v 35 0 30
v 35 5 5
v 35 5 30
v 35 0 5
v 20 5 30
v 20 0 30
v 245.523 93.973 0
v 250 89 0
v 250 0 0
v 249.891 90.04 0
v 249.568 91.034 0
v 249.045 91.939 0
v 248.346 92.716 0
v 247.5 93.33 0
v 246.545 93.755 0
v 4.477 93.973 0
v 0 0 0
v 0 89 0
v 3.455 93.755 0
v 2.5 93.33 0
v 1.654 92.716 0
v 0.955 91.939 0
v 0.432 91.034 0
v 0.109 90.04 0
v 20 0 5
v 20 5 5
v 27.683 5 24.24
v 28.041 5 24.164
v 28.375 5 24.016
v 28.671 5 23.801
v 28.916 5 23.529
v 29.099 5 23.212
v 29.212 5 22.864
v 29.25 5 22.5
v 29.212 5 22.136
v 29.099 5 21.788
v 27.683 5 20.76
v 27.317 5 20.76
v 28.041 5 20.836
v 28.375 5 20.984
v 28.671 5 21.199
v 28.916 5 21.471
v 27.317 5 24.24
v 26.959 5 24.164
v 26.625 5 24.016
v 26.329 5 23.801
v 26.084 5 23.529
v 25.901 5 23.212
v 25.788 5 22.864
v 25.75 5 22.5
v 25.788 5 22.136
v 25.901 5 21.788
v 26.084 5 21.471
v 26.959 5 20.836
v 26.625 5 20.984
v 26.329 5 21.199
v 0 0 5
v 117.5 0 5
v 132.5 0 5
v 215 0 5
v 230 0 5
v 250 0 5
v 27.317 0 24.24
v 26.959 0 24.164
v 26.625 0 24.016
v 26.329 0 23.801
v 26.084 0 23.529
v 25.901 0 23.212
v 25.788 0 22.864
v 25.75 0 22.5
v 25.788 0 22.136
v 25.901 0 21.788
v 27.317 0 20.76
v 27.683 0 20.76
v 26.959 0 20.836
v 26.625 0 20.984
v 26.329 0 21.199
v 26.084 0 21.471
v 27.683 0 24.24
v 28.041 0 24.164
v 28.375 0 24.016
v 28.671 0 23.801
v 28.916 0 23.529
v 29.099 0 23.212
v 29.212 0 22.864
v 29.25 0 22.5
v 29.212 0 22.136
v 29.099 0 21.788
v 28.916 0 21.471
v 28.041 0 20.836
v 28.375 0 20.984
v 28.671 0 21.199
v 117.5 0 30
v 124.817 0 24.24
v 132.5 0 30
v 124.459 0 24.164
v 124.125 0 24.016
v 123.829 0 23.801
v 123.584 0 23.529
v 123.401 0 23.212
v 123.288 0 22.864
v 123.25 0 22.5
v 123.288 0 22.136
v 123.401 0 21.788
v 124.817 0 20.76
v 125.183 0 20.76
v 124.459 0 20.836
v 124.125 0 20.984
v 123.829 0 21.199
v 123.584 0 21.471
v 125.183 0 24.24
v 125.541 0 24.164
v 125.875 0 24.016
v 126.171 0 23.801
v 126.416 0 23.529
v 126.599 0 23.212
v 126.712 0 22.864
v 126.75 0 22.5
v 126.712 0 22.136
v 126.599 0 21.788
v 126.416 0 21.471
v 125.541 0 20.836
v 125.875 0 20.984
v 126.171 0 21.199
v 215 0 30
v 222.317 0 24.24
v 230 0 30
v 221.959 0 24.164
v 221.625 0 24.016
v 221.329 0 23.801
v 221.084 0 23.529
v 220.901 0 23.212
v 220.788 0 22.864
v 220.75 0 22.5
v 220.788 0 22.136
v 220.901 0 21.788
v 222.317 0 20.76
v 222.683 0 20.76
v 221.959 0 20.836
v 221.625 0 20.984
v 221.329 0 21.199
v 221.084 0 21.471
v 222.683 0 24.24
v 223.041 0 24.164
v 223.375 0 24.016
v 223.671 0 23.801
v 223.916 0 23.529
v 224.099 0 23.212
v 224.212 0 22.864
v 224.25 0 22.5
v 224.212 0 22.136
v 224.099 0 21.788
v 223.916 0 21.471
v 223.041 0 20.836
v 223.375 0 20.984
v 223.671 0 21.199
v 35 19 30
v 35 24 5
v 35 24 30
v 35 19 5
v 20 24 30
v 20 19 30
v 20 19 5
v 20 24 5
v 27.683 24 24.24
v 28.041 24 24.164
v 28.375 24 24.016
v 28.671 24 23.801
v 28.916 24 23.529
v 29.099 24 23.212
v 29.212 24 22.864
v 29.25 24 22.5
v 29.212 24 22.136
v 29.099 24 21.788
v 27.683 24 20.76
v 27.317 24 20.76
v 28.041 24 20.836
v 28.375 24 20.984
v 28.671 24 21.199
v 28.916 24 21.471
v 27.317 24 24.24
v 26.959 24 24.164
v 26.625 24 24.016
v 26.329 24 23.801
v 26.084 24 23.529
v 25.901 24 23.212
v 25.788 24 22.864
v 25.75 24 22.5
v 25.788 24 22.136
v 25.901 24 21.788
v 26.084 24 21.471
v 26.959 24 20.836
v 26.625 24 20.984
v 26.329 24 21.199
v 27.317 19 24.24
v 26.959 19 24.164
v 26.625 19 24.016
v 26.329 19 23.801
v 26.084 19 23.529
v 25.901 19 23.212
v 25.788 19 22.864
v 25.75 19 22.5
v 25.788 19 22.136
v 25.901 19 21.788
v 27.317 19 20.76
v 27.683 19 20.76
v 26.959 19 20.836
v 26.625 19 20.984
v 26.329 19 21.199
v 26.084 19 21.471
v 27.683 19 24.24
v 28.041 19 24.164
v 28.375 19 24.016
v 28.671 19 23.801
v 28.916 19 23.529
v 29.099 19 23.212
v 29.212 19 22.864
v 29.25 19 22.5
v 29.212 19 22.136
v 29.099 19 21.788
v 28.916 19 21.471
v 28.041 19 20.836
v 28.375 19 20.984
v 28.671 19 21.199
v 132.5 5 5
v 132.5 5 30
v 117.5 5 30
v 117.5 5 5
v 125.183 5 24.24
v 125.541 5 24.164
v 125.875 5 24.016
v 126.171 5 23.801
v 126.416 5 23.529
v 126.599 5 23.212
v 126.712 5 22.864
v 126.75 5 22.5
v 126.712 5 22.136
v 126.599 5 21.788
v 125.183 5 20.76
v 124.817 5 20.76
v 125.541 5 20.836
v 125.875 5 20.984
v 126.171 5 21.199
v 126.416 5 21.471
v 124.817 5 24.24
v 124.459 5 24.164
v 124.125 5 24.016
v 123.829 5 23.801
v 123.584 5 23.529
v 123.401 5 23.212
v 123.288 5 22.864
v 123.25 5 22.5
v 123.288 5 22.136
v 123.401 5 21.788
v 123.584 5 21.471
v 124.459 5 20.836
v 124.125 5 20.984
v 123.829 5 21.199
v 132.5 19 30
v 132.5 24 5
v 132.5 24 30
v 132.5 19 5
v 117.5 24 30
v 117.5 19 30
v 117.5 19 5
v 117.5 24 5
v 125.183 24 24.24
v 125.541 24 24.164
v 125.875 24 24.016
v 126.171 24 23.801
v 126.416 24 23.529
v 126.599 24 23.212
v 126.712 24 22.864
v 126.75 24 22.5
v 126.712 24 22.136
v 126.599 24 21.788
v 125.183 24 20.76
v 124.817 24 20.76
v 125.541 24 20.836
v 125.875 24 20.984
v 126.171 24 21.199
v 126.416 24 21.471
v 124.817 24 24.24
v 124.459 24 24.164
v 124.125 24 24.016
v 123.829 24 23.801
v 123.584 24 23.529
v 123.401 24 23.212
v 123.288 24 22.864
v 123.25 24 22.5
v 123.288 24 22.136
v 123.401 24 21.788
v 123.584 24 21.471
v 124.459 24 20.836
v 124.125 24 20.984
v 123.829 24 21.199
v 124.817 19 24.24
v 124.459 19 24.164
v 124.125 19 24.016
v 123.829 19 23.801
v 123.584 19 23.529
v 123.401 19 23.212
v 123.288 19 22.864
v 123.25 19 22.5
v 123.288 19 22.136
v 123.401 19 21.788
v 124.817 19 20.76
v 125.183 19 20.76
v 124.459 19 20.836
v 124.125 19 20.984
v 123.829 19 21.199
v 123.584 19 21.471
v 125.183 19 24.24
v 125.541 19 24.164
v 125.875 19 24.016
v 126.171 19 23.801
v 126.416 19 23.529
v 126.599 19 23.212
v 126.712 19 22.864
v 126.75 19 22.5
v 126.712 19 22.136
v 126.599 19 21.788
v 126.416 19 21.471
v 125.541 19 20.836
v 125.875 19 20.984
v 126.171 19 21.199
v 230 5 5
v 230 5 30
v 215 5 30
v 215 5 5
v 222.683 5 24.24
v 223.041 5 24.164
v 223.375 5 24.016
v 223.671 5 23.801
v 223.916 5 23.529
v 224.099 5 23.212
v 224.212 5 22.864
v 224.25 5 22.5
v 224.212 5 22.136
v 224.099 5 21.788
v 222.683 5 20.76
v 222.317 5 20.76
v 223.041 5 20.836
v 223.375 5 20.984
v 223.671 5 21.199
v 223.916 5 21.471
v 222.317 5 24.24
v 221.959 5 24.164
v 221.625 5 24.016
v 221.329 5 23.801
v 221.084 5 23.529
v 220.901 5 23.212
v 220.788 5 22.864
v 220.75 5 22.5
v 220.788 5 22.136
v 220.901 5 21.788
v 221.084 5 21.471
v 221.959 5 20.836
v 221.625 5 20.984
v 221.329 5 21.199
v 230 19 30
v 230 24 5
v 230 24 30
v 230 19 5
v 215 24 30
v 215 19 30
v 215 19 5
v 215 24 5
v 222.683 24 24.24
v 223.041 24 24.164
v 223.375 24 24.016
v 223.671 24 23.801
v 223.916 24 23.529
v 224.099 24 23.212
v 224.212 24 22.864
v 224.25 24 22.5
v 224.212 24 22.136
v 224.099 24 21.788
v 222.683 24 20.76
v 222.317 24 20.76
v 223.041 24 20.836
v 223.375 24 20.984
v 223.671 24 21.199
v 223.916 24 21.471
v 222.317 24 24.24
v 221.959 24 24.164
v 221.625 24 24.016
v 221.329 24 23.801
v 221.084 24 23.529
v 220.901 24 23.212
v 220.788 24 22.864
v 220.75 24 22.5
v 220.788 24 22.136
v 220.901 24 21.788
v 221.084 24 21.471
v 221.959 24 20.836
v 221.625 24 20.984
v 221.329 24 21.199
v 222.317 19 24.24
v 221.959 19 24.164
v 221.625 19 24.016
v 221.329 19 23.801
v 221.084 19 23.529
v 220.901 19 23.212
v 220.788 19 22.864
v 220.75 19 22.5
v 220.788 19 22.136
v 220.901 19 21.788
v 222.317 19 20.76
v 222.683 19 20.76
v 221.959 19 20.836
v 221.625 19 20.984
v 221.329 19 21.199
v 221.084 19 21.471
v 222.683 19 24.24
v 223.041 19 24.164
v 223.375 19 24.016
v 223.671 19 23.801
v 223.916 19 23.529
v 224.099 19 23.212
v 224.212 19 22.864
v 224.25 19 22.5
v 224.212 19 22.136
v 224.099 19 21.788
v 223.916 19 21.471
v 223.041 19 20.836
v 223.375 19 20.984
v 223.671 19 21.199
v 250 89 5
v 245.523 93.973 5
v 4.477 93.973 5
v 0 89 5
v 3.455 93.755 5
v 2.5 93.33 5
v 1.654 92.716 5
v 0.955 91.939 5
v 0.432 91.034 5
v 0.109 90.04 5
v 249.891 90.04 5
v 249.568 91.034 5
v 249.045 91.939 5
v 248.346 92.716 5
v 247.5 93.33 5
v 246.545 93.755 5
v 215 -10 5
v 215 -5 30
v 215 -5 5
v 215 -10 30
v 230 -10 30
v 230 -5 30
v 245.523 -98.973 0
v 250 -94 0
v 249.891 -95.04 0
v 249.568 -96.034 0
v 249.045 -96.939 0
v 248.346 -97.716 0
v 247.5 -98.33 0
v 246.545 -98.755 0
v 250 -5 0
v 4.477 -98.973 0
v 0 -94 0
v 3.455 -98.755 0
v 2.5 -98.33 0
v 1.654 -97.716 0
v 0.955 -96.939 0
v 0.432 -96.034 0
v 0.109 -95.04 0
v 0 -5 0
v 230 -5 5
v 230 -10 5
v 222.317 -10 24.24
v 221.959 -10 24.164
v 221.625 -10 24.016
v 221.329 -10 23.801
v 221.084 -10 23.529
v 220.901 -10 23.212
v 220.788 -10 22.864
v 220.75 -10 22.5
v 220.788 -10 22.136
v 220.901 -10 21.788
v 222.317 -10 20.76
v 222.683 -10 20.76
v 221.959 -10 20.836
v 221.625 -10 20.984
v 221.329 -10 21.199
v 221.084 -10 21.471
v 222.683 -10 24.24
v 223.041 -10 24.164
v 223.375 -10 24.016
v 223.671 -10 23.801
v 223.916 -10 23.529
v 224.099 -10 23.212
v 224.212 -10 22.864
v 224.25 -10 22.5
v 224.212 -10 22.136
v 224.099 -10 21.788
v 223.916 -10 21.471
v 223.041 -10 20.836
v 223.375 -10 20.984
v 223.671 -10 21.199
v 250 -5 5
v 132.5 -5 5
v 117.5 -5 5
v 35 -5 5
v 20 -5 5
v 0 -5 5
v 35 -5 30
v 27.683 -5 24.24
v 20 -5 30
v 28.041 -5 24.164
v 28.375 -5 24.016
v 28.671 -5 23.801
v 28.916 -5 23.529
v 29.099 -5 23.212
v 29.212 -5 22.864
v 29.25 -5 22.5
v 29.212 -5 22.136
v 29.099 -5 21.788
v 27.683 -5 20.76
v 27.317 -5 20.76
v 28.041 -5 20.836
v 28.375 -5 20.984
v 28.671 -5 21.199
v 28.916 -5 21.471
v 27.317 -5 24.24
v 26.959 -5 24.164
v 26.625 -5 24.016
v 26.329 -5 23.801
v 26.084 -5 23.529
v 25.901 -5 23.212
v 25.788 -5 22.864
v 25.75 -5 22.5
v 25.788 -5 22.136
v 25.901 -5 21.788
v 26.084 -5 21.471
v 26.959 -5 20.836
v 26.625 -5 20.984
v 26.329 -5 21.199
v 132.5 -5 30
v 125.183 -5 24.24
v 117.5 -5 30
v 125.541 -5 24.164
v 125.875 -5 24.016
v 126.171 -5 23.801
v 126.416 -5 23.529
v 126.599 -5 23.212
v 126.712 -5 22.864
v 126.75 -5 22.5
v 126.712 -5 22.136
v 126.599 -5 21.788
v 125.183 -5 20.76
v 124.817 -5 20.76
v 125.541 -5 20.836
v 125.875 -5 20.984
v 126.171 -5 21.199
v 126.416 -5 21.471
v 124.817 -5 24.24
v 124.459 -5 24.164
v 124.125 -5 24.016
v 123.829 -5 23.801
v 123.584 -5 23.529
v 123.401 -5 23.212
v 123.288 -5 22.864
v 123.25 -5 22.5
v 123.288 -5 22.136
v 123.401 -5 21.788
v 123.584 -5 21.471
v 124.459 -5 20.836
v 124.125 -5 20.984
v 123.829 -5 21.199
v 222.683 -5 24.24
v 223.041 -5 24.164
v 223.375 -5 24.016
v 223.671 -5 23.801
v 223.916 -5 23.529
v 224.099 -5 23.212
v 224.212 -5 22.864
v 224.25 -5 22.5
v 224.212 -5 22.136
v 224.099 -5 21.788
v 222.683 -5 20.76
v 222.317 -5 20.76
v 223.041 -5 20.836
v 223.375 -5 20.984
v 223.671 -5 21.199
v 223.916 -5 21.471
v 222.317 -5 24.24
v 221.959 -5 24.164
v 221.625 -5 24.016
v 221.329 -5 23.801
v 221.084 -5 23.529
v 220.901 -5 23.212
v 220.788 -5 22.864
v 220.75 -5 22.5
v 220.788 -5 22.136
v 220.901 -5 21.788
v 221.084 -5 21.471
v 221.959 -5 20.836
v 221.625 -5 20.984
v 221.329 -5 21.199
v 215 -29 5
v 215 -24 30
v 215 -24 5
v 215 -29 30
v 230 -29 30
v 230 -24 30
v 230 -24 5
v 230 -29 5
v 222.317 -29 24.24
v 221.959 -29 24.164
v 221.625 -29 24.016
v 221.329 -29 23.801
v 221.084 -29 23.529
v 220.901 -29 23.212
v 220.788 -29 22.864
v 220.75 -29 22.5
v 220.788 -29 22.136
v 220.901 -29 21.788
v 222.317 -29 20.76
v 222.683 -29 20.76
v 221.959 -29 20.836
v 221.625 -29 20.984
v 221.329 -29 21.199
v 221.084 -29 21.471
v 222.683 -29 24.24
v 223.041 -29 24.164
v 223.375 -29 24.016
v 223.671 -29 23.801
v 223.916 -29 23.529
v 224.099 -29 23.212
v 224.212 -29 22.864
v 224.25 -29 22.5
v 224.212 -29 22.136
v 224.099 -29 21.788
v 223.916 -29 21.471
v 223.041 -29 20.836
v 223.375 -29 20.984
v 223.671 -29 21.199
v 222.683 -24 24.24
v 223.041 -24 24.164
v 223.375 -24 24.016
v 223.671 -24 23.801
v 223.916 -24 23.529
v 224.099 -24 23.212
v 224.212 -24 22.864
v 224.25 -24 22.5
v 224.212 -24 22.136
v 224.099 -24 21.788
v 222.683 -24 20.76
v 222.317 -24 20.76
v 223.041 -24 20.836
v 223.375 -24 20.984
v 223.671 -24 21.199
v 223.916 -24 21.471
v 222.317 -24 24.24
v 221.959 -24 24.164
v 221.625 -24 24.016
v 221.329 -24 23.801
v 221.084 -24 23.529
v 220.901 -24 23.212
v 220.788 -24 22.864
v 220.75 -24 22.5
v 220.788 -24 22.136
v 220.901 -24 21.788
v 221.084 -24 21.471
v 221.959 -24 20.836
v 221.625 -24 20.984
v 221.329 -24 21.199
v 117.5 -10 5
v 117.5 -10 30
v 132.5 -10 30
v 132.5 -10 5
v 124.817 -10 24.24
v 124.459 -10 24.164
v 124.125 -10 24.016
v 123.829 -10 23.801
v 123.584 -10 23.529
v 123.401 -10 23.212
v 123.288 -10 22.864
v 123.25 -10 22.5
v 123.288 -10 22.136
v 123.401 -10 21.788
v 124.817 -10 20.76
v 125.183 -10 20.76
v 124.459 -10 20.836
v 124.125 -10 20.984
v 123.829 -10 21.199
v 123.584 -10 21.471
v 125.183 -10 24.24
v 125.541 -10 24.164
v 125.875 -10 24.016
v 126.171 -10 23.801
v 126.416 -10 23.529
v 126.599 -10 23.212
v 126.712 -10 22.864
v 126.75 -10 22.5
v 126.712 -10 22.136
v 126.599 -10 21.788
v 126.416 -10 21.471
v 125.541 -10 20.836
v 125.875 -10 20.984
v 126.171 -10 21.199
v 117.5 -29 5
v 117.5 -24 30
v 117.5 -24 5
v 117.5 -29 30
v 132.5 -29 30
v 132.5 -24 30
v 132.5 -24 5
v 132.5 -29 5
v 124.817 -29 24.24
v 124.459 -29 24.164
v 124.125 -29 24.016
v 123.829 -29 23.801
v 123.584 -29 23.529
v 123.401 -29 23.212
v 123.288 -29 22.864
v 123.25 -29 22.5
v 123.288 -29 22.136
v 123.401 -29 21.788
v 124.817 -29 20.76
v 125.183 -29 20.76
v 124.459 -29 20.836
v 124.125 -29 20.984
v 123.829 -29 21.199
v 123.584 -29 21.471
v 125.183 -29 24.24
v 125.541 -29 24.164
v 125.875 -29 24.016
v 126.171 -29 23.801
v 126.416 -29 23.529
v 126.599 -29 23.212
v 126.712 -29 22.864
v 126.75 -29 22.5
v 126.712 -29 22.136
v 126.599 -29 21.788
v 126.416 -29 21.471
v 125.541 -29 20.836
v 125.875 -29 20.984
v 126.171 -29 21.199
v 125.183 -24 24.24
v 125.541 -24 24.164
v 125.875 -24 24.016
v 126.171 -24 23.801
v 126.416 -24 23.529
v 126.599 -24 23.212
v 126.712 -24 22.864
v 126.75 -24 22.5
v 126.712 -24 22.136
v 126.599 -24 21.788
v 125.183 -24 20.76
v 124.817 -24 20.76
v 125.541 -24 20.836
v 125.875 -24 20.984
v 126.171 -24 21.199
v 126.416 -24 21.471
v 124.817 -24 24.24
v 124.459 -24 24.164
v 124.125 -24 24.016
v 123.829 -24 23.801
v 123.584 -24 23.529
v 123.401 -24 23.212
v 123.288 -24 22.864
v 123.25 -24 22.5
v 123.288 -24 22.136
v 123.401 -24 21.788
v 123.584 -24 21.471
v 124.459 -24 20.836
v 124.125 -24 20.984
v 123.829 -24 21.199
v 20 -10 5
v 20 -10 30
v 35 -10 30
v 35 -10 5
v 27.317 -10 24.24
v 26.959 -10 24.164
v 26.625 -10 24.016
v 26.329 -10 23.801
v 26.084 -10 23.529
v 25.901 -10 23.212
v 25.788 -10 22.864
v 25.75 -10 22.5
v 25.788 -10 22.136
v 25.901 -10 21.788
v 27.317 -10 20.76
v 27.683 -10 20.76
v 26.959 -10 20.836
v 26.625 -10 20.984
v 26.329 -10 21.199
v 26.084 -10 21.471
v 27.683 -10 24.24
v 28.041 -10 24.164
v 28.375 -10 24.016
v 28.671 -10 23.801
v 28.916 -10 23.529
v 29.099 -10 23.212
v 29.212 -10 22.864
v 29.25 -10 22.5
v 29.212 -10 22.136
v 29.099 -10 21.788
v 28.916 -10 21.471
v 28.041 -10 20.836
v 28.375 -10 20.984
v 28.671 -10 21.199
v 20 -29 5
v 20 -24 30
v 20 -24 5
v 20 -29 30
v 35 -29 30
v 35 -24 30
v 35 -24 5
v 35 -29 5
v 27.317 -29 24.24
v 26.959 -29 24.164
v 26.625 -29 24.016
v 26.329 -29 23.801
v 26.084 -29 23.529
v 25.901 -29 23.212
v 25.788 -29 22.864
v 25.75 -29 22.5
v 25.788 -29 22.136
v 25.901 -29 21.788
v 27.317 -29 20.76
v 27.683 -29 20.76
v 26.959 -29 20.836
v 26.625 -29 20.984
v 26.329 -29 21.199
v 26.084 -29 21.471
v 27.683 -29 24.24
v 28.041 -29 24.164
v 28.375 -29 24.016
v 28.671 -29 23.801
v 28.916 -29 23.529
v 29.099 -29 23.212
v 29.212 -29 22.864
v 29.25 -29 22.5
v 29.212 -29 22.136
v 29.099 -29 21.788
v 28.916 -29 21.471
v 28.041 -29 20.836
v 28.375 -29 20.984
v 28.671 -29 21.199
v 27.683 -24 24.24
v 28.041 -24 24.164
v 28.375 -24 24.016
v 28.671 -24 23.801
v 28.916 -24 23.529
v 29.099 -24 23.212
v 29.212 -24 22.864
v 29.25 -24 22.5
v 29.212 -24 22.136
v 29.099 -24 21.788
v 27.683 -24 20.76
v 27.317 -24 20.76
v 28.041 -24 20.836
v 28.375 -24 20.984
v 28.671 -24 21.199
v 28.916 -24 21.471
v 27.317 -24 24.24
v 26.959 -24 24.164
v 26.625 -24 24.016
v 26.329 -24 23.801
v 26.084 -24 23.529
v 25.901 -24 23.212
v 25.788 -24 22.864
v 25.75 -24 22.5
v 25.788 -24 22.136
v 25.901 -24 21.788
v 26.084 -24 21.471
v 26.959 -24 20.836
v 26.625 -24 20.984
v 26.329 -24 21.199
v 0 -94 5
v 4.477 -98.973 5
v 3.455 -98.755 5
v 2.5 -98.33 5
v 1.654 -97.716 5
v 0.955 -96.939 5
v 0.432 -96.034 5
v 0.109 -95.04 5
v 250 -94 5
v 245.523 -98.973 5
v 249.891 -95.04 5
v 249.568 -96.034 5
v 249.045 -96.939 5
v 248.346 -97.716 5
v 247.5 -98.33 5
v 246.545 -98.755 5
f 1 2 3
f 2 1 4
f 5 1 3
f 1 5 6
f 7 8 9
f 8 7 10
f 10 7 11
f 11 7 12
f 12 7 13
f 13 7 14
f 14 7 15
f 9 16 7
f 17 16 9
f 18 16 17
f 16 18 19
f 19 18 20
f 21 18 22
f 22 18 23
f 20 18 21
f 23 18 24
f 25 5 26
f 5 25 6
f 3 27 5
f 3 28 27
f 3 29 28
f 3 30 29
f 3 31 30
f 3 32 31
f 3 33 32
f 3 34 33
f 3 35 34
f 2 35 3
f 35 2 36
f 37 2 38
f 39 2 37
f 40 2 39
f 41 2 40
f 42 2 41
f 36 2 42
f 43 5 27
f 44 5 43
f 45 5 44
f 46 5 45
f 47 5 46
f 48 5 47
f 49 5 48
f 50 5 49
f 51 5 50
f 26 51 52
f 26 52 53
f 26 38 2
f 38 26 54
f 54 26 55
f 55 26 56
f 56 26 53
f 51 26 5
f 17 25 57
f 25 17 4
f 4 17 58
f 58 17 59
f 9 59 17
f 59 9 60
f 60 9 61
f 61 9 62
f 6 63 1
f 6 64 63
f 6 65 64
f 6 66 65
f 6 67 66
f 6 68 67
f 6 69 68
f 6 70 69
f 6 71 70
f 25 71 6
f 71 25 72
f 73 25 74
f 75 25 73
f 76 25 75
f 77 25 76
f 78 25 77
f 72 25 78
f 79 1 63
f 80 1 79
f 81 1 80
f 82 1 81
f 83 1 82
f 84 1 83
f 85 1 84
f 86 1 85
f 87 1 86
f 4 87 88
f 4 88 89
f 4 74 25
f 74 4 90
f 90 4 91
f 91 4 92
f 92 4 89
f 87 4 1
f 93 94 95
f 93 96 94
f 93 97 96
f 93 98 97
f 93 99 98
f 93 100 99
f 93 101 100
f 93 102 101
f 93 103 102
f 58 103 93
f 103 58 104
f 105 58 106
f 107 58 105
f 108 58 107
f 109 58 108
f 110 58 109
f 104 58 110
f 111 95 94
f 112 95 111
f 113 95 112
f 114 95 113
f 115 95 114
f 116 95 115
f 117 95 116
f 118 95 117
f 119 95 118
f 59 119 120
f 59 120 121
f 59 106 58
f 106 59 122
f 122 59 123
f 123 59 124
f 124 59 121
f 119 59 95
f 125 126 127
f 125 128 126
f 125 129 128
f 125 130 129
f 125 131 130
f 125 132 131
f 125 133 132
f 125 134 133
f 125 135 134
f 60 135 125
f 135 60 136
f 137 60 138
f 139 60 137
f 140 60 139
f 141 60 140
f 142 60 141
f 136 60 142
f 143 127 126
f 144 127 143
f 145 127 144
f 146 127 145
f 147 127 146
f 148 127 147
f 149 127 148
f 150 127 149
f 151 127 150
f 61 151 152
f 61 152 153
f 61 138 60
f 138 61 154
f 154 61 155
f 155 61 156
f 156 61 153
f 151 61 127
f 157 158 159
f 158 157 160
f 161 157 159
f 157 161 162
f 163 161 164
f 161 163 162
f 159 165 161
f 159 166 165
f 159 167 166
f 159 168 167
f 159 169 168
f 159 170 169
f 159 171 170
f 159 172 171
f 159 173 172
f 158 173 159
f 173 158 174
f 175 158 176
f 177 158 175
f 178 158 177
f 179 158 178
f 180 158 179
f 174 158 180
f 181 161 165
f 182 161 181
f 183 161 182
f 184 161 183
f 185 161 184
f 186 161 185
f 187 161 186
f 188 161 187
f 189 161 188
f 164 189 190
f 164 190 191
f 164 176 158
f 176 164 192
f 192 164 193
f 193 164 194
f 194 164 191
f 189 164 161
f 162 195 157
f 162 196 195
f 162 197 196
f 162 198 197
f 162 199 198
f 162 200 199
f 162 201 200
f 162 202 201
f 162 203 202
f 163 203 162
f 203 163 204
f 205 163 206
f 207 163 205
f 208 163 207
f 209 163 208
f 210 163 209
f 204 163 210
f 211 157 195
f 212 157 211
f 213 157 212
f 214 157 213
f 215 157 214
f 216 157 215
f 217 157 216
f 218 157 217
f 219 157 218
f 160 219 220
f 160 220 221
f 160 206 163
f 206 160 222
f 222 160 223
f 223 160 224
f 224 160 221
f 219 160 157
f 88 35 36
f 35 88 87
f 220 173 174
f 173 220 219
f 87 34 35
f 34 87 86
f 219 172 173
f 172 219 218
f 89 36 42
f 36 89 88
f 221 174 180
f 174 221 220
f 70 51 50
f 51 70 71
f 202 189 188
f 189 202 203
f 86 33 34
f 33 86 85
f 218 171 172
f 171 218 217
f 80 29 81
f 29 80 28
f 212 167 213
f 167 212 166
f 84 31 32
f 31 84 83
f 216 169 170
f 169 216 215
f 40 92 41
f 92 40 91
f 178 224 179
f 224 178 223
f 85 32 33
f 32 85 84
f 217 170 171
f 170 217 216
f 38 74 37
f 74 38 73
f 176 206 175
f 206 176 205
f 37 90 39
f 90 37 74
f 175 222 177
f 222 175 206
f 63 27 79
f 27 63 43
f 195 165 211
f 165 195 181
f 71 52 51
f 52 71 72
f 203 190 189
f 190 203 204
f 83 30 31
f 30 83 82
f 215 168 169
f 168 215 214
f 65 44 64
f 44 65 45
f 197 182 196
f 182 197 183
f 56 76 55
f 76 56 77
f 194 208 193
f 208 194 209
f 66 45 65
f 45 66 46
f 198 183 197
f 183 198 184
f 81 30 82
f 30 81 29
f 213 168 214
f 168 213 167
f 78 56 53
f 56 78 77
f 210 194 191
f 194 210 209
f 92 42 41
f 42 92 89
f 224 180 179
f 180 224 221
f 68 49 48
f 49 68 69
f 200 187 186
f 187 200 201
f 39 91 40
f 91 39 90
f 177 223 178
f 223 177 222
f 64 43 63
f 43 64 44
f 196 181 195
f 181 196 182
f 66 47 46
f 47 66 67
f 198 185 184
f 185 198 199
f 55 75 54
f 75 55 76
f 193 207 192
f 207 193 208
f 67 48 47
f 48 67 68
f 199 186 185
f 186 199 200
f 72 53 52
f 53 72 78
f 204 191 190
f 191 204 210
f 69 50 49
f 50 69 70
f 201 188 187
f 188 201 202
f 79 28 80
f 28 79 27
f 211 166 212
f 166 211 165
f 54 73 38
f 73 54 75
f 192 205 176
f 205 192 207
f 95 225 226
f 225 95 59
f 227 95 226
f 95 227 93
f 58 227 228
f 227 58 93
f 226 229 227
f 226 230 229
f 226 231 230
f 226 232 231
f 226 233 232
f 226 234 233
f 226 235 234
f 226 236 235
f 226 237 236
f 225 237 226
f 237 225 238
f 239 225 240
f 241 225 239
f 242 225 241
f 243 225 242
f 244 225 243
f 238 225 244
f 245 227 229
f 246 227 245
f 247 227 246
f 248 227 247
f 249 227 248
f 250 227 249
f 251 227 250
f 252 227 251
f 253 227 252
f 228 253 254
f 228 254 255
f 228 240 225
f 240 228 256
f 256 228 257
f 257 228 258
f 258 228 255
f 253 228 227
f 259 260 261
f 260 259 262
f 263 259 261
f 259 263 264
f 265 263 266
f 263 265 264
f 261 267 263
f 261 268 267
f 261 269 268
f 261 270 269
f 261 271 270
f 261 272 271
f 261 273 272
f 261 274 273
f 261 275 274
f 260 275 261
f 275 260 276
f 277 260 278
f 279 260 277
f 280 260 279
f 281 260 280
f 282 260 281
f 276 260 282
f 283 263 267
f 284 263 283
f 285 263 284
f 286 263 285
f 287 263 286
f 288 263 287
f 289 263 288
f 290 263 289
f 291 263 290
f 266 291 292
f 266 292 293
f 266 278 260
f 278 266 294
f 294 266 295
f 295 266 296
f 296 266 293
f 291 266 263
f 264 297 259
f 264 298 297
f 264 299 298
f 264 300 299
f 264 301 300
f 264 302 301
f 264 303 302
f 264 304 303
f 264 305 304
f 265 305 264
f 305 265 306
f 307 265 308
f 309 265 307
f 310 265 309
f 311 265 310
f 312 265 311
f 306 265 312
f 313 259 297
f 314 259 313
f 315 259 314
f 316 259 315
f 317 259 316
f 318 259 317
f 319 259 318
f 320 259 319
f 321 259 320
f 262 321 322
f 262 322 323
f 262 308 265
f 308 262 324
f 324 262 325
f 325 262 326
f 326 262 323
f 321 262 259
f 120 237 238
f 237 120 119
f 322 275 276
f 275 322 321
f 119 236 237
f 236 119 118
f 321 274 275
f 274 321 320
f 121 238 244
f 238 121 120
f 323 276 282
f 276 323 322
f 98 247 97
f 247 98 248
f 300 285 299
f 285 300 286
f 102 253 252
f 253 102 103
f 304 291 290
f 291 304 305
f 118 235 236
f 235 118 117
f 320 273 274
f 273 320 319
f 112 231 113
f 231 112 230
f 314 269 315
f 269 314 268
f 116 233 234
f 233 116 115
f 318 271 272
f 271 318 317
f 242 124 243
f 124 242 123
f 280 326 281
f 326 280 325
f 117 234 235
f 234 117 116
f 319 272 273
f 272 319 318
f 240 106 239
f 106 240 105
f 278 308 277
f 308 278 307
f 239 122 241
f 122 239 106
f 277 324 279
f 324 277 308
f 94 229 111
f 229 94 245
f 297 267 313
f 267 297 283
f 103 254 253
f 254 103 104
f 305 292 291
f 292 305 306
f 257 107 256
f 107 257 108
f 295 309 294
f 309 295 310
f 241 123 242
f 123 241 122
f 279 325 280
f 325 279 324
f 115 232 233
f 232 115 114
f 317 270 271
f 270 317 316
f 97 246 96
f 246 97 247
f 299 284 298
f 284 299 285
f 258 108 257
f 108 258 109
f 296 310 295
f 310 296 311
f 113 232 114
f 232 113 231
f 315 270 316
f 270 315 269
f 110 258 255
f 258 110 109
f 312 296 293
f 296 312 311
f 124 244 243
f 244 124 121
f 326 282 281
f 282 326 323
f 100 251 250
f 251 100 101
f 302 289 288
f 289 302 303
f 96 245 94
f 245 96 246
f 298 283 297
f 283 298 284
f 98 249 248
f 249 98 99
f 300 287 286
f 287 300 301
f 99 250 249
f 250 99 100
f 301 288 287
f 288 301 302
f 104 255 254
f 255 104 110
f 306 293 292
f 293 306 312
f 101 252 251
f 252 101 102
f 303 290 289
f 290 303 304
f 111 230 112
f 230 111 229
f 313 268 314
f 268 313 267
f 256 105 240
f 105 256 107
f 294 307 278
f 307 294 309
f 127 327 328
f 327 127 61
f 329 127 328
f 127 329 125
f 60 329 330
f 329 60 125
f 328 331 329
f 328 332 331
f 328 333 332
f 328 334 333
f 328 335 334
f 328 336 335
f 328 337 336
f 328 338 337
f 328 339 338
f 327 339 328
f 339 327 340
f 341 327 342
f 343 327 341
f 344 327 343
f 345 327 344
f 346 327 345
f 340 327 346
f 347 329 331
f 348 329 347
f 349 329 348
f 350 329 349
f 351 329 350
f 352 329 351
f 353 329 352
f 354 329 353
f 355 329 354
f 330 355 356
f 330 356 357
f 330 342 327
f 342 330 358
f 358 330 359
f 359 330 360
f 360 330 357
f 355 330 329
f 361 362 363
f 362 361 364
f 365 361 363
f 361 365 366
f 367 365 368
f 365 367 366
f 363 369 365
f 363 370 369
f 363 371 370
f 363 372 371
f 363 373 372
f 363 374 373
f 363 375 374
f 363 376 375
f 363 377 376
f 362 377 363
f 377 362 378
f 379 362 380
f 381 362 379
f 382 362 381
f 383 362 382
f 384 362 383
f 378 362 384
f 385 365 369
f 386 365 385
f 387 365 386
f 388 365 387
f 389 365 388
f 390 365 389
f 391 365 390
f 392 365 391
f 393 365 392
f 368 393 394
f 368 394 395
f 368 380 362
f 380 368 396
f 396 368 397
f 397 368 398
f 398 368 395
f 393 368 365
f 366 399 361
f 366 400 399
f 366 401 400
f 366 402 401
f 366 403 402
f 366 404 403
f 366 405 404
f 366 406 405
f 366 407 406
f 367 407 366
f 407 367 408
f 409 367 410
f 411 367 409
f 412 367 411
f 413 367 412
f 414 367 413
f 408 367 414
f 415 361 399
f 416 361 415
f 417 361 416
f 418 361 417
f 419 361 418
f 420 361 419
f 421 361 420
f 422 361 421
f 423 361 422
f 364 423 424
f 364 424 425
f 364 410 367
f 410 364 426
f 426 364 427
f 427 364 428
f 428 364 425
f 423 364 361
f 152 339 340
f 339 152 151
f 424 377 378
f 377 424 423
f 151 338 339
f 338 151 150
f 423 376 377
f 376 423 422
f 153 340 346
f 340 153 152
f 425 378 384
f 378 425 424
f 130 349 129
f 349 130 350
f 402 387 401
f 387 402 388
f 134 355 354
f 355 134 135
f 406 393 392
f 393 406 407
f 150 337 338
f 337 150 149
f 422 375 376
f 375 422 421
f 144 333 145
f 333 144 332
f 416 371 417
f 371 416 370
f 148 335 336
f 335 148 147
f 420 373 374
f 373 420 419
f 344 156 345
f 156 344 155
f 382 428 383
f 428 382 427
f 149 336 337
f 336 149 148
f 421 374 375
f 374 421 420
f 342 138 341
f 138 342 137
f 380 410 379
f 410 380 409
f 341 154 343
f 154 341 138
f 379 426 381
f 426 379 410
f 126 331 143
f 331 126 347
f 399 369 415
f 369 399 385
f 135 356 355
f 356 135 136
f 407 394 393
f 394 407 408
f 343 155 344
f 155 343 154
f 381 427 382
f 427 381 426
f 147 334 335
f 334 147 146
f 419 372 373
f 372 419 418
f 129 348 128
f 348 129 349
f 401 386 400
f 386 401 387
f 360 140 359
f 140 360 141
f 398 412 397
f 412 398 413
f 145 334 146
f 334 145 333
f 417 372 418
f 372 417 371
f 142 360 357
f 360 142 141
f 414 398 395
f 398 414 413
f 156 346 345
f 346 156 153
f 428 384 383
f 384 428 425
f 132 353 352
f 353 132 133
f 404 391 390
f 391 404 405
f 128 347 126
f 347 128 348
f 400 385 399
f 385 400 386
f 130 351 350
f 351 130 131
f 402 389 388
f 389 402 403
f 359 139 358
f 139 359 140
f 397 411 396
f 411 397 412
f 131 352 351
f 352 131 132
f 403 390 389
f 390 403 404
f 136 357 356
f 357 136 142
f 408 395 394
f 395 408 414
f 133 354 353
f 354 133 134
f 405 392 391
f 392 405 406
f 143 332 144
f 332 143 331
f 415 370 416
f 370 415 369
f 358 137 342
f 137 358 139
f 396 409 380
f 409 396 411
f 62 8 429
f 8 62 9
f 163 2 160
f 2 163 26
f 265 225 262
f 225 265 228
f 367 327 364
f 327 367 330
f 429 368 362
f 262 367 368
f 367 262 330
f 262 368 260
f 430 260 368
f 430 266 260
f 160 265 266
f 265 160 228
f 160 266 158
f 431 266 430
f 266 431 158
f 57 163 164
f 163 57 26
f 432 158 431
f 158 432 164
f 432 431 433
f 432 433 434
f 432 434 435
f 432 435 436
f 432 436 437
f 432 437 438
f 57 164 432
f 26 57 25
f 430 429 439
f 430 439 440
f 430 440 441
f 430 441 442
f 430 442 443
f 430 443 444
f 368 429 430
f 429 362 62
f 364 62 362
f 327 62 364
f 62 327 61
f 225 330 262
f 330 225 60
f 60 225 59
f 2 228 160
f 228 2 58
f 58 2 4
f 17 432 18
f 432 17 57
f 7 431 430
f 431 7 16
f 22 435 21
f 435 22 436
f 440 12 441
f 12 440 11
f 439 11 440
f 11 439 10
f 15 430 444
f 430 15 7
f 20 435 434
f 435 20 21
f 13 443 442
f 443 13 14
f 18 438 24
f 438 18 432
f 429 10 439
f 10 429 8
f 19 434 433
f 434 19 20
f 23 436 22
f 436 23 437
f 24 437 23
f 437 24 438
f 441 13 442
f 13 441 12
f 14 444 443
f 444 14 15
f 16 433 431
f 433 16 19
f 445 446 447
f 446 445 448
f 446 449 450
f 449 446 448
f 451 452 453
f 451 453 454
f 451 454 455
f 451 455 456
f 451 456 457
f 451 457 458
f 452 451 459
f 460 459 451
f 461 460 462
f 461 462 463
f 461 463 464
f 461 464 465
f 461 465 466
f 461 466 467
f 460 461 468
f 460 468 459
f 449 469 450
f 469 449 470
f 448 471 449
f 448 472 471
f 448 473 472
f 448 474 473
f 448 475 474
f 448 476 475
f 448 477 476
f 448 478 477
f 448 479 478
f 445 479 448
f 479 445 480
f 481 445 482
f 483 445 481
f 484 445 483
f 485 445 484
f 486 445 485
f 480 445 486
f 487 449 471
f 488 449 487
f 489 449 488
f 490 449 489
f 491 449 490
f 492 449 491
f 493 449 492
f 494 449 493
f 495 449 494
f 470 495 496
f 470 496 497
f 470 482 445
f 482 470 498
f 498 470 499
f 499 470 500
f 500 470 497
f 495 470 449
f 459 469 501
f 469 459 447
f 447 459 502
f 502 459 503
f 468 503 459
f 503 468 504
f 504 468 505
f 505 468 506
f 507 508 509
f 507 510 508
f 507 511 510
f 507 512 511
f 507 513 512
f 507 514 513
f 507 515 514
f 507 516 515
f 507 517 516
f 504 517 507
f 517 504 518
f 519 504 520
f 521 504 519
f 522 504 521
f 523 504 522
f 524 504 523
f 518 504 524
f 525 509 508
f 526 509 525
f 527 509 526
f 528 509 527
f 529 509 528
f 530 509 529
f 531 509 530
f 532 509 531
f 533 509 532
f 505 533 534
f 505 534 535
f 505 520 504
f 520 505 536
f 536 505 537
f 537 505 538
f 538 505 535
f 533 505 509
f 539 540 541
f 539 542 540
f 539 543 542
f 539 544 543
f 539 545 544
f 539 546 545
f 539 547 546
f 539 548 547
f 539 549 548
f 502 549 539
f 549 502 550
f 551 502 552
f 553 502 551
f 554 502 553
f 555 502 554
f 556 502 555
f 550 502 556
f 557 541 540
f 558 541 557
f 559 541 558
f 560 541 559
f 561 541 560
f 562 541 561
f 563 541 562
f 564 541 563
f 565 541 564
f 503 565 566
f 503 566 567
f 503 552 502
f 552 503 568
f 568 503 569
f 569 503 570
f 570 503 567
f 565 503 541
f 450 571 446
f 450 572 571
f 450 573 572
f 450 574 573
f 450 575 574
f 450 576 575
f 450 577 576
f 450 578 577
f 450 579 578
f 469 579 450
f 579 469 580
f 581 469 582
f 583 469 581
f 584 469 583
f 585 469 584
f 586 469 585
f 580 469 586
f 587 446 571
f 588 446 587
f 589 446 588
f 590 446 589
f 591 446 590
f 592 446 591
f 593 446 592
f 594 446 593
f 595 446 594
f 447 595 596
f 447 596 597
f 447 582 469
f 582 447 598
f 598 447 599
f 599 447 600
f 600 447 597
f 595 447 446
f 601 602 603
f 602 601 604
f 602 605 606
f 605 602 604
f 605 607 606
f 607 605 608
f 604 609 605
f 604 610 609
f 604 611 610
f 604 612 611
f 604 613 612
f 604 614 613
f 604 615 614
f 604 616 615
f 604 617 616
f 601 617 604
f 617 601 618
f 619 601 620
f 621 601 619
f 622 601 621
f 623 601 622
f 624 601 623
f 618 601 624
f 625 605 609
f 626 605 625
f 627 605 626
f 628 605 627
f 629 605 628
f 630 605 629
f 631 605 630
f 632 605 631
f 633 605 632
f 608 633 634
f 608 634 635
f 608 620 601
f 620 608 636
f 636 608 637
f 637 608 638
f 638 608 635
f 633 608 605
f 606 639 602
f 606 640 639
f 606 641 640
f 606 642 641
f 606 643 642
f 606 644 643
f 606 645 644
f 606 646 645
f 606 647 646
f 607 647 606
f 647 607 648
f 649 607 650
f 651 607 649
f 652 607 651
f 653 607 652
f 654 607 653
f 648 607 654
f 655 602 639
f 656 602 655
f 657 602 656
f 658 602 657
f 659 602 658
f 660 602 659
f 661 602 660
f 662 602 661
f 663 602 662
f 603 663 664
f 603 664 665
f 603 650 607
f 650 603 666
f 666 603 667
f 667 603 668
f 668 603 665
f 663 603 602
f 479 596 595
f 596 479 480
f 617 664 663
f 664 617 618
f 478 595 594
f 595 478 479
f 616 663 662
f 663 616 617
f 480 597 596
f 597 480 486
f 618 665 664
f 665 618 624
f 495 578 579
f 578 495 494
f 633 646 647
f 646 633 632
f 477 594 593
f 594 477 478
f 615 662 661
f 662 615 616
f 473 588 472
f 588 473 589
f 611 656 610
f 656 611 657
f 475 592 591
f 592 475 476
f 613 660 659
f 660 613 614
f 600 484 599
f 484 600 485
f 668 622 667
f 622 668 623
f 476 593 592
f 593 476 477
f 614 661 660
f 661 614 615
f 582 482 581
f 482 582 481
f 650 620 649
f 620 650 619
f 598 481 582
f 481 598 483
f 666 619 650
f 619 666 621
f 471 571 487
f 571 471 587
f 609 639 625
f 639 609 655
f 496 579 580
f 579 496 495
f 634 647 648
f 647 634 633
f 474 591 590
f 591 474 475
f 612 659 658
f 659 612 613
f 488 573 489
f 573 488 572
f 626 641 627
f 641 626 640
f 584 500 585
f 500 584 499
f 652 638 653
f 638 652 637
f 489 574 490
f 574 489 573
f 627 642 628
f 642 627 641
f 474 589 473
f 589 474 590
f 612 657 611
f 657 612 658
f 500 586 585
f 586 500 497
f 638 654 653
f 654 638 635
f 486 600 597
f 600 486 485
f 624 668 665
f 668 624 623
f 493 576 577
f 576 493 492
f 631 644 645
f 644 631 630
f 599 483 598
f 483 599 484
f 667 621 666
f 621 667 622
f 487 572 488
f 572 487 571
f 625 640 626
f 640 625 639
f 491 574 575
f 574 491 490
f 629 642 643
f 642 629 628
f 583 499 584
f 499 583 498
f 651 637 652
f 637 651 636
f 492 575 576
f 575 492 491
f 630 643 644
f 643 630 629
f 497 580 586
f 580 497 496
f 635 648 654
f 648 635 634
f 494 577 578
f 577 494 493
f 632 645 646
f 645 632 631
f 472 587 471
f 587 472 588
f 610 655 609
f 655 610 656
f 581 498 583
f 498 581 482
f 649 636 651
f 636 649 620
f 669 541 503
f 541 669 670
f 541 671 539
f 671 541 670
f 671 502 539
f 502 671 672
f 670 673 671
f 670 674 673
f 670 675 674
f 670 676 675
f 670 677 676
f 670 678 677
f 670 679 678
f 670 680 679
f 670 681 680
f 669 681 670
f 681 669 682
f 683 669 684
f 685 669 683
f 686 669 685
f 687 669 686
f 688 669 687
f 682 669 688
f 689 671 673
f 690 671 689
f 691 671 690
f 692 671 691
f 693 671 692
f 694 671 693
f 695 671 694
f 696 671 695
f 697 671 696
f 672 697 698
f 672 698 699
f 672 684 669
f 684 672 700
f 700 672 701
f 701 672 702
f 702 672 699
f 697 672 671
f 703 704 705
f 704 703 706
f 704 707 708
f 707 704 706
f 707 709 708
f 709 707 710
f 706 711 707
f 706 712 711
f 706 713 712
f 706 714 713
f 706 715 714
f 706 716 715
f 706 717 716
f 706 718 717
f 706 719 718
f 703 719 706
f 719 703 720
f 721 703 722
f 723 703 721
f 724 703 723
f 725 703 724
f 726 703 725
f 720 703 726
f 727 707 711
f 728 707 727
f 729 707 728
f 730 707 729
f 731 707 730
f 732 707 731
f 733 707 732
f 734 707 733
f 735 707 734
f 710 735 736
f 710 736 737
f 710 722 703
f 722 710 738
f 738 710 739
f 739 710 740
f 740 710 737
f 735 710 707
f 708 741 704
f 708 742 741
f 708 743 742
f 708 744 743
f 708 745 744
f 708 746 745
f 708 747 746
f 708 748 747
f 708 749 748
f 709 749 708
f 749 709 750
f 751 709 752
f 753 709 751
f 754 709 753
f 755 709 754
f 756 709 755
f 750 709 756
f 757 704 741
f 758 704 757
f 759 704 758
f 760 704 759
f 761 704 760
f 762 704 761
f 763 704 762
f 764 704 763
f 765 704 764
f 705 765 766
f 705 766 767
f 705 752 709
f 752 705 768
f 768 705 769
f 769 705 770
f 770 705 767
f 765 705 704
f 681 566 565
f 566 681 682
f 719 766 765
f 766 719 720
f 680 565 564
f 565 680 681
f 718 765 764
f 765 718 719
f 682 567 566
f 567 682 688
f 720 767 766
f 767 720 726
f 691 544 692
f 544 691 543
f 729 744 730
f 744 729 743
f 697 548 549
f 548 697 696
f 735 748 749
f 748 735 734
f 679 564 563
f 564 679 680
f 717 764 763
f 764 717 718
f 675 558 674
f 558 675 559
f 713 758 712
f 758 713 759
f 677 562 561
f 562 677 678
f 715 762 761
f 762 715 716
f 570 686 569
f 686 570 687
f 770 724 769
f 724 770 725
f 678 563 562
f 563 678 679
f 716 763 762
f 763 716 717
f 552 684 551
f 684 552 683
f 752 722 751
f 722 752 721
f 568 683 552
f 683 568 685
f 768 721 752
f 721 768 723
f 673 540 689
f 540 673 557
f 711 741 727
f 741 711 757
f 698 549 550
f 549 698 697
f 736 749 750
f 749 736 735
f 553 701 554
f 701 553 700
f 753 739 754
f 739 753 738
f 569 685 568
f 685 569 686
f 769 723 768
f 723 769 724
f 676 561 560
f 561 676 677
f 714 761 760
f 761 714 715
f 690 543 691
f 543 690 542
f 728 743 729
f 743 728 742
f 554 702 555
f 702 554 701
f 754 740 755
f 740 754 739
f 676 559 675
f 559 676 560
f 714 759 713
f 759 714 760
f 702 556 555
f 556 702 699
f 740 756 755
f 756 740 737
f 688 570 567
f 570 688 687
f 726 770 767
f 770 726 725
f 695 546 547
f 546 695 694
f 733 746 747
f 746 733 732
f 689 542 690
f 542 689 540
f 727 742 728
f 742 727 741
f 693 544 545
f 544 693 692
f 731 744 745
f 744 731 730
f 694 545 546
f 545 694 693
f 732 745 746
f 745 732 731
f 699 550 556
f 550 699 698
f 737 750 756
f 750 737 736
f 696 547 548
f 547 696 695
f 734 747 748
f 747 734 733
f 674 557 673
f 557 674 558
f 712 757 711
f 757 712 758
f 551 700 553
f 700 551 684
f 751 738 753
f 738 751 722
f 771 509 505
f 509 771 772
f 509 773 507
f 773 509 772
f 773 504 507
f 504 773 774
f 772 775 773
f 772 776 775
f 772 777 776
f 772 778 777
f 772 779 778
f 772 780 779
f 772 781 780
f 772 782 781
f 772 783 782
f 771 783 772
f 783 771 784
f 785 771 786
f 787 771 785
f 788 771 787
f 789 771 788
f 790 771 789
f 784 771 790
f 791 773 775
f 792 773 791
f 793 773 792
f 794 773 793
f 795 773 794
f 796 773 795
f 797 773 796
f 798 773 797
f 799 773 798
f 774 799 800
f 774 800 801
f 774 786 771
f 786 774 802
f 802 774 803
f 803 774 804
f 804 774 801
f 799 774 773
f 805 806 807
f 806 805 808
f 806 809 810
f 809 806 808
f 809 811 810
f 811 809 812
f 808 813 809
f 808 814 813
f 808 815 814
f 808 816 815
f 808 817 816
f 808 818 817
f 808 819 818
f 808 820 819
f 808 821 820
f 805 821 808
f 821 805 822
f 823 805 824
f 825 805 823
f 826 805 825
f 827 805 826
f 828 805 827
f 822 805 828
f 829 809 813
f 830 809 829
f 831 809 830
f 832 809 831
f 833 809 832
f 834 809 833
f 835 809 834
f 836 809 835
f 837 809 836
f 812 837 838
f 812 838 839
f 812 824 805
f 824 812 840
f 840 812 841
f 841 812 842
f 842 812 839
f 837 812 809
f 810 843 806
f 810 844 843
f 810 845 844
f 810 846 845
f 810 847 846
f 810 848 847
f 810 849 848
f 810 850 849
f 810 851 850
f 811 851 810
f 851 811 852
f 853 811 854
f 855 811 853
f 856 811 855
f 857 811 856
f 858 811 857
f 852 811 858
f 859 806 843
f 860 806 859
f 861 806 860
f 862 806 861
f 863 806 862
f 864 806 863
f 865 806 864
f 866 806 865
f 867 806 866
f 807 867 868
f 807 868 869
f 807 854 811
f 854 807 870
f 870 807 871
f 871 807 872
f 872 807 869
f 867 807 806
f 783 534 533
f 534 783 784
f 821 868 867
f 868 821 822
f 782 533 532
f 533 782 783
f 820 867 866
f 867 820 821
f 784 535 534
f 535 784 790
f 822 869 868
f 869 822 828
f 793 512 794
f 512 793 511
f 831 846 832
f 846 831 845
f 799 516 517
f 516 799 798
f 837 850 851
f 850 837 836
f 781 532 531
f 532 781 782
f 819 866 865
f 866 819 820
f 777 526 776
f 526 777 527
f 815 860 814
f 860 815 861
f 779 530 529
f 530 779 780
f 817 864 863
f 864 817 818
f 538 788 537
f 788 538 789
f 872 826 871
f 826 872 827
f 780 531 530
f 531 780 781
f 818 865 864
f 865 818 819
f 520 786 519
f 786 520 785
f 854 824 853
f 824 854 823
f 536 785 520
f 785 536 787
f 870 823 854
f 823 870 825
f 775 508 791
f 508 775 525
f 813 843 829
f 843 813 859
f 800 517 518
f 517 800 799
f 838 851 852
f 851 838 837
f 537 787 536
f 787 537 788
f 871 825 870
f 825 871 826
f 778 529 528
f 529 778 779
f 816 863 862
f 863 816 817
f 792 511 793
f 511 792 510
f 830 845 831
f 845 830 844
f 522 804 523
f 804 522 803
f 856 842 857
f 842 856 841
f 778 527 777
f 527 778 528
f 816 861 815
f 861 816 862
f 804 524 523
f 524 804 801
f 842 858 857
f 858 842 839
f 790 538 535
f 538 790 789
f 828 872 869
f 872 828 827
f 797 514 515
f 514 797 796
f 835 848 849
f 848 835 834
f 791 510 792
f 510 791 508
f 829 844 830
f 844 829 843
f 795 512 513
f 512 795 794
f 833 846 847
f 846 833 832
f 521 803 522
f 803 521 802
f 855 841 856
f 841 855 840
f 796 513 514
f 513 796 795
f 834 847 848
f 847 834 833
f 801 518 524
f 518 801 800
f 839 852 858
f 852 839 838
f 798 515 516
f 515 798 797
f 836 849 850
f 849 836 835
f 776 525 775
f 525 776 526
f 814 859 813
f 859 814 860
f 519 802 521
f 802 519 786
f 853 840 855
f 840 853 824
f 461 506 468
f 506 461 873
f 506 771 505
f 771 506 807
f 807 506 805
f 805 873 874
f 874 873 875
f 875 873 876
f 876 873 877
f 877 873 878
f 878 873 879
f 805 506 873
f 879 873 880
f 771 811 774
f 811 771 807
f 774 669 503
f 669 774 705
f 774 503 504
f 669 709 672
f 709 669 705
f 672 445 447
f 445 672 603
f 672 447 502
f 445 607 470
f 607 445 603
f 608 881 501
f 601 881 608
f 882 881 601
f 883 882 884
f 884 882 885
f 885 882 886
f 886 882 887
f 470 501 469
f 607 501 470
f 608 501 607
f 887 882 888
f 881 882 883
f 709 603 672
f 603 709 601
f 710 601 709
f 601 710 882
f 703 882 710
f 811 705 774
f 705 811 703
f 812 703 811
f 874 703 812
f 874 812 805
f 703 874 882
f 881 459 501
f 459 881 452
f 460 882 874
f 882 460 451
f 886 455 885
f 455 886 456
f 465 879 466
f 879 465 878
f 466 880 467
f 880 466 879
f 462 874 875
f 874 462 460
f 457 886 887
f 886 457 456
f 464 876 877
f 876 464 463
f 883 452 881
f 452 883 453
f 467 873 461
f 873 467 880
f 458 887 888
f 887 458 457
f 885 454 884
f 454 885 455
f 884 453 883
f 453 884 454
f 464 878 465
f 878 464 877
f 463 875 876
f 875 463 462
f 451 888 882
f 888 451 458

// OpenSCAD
$fn=30;

module part()
{
  // bottom part
  cube([250, 2*5+70+14-10/2, 5]);
  // rounder corners
  hull()
    for(i=[0,1])
      translate([i*(250-10)+10/2, 2*5+70+14-10/2, 0])
        cylinder(r=10/2, h=5);
  // mounts
  for(dx=[20, (250-30/2)/2 , 250-20-30/2])
  {
    difference()
    {
      // towers
      union()
      {
        for(dy=[0, 14+5])
          translate([dx, dy, 0])
            cube([15, 5, 30]);
      }
      // drill holes
      translate([dx+15/2, -1, 30-15/2])
        rotate([-90, 0, 0])
          cylinder(r=3.5/2, 28);
    }
  }
}

part();
translate([250, -5, 0])
  rotate([0, 0, 180])
    part();
